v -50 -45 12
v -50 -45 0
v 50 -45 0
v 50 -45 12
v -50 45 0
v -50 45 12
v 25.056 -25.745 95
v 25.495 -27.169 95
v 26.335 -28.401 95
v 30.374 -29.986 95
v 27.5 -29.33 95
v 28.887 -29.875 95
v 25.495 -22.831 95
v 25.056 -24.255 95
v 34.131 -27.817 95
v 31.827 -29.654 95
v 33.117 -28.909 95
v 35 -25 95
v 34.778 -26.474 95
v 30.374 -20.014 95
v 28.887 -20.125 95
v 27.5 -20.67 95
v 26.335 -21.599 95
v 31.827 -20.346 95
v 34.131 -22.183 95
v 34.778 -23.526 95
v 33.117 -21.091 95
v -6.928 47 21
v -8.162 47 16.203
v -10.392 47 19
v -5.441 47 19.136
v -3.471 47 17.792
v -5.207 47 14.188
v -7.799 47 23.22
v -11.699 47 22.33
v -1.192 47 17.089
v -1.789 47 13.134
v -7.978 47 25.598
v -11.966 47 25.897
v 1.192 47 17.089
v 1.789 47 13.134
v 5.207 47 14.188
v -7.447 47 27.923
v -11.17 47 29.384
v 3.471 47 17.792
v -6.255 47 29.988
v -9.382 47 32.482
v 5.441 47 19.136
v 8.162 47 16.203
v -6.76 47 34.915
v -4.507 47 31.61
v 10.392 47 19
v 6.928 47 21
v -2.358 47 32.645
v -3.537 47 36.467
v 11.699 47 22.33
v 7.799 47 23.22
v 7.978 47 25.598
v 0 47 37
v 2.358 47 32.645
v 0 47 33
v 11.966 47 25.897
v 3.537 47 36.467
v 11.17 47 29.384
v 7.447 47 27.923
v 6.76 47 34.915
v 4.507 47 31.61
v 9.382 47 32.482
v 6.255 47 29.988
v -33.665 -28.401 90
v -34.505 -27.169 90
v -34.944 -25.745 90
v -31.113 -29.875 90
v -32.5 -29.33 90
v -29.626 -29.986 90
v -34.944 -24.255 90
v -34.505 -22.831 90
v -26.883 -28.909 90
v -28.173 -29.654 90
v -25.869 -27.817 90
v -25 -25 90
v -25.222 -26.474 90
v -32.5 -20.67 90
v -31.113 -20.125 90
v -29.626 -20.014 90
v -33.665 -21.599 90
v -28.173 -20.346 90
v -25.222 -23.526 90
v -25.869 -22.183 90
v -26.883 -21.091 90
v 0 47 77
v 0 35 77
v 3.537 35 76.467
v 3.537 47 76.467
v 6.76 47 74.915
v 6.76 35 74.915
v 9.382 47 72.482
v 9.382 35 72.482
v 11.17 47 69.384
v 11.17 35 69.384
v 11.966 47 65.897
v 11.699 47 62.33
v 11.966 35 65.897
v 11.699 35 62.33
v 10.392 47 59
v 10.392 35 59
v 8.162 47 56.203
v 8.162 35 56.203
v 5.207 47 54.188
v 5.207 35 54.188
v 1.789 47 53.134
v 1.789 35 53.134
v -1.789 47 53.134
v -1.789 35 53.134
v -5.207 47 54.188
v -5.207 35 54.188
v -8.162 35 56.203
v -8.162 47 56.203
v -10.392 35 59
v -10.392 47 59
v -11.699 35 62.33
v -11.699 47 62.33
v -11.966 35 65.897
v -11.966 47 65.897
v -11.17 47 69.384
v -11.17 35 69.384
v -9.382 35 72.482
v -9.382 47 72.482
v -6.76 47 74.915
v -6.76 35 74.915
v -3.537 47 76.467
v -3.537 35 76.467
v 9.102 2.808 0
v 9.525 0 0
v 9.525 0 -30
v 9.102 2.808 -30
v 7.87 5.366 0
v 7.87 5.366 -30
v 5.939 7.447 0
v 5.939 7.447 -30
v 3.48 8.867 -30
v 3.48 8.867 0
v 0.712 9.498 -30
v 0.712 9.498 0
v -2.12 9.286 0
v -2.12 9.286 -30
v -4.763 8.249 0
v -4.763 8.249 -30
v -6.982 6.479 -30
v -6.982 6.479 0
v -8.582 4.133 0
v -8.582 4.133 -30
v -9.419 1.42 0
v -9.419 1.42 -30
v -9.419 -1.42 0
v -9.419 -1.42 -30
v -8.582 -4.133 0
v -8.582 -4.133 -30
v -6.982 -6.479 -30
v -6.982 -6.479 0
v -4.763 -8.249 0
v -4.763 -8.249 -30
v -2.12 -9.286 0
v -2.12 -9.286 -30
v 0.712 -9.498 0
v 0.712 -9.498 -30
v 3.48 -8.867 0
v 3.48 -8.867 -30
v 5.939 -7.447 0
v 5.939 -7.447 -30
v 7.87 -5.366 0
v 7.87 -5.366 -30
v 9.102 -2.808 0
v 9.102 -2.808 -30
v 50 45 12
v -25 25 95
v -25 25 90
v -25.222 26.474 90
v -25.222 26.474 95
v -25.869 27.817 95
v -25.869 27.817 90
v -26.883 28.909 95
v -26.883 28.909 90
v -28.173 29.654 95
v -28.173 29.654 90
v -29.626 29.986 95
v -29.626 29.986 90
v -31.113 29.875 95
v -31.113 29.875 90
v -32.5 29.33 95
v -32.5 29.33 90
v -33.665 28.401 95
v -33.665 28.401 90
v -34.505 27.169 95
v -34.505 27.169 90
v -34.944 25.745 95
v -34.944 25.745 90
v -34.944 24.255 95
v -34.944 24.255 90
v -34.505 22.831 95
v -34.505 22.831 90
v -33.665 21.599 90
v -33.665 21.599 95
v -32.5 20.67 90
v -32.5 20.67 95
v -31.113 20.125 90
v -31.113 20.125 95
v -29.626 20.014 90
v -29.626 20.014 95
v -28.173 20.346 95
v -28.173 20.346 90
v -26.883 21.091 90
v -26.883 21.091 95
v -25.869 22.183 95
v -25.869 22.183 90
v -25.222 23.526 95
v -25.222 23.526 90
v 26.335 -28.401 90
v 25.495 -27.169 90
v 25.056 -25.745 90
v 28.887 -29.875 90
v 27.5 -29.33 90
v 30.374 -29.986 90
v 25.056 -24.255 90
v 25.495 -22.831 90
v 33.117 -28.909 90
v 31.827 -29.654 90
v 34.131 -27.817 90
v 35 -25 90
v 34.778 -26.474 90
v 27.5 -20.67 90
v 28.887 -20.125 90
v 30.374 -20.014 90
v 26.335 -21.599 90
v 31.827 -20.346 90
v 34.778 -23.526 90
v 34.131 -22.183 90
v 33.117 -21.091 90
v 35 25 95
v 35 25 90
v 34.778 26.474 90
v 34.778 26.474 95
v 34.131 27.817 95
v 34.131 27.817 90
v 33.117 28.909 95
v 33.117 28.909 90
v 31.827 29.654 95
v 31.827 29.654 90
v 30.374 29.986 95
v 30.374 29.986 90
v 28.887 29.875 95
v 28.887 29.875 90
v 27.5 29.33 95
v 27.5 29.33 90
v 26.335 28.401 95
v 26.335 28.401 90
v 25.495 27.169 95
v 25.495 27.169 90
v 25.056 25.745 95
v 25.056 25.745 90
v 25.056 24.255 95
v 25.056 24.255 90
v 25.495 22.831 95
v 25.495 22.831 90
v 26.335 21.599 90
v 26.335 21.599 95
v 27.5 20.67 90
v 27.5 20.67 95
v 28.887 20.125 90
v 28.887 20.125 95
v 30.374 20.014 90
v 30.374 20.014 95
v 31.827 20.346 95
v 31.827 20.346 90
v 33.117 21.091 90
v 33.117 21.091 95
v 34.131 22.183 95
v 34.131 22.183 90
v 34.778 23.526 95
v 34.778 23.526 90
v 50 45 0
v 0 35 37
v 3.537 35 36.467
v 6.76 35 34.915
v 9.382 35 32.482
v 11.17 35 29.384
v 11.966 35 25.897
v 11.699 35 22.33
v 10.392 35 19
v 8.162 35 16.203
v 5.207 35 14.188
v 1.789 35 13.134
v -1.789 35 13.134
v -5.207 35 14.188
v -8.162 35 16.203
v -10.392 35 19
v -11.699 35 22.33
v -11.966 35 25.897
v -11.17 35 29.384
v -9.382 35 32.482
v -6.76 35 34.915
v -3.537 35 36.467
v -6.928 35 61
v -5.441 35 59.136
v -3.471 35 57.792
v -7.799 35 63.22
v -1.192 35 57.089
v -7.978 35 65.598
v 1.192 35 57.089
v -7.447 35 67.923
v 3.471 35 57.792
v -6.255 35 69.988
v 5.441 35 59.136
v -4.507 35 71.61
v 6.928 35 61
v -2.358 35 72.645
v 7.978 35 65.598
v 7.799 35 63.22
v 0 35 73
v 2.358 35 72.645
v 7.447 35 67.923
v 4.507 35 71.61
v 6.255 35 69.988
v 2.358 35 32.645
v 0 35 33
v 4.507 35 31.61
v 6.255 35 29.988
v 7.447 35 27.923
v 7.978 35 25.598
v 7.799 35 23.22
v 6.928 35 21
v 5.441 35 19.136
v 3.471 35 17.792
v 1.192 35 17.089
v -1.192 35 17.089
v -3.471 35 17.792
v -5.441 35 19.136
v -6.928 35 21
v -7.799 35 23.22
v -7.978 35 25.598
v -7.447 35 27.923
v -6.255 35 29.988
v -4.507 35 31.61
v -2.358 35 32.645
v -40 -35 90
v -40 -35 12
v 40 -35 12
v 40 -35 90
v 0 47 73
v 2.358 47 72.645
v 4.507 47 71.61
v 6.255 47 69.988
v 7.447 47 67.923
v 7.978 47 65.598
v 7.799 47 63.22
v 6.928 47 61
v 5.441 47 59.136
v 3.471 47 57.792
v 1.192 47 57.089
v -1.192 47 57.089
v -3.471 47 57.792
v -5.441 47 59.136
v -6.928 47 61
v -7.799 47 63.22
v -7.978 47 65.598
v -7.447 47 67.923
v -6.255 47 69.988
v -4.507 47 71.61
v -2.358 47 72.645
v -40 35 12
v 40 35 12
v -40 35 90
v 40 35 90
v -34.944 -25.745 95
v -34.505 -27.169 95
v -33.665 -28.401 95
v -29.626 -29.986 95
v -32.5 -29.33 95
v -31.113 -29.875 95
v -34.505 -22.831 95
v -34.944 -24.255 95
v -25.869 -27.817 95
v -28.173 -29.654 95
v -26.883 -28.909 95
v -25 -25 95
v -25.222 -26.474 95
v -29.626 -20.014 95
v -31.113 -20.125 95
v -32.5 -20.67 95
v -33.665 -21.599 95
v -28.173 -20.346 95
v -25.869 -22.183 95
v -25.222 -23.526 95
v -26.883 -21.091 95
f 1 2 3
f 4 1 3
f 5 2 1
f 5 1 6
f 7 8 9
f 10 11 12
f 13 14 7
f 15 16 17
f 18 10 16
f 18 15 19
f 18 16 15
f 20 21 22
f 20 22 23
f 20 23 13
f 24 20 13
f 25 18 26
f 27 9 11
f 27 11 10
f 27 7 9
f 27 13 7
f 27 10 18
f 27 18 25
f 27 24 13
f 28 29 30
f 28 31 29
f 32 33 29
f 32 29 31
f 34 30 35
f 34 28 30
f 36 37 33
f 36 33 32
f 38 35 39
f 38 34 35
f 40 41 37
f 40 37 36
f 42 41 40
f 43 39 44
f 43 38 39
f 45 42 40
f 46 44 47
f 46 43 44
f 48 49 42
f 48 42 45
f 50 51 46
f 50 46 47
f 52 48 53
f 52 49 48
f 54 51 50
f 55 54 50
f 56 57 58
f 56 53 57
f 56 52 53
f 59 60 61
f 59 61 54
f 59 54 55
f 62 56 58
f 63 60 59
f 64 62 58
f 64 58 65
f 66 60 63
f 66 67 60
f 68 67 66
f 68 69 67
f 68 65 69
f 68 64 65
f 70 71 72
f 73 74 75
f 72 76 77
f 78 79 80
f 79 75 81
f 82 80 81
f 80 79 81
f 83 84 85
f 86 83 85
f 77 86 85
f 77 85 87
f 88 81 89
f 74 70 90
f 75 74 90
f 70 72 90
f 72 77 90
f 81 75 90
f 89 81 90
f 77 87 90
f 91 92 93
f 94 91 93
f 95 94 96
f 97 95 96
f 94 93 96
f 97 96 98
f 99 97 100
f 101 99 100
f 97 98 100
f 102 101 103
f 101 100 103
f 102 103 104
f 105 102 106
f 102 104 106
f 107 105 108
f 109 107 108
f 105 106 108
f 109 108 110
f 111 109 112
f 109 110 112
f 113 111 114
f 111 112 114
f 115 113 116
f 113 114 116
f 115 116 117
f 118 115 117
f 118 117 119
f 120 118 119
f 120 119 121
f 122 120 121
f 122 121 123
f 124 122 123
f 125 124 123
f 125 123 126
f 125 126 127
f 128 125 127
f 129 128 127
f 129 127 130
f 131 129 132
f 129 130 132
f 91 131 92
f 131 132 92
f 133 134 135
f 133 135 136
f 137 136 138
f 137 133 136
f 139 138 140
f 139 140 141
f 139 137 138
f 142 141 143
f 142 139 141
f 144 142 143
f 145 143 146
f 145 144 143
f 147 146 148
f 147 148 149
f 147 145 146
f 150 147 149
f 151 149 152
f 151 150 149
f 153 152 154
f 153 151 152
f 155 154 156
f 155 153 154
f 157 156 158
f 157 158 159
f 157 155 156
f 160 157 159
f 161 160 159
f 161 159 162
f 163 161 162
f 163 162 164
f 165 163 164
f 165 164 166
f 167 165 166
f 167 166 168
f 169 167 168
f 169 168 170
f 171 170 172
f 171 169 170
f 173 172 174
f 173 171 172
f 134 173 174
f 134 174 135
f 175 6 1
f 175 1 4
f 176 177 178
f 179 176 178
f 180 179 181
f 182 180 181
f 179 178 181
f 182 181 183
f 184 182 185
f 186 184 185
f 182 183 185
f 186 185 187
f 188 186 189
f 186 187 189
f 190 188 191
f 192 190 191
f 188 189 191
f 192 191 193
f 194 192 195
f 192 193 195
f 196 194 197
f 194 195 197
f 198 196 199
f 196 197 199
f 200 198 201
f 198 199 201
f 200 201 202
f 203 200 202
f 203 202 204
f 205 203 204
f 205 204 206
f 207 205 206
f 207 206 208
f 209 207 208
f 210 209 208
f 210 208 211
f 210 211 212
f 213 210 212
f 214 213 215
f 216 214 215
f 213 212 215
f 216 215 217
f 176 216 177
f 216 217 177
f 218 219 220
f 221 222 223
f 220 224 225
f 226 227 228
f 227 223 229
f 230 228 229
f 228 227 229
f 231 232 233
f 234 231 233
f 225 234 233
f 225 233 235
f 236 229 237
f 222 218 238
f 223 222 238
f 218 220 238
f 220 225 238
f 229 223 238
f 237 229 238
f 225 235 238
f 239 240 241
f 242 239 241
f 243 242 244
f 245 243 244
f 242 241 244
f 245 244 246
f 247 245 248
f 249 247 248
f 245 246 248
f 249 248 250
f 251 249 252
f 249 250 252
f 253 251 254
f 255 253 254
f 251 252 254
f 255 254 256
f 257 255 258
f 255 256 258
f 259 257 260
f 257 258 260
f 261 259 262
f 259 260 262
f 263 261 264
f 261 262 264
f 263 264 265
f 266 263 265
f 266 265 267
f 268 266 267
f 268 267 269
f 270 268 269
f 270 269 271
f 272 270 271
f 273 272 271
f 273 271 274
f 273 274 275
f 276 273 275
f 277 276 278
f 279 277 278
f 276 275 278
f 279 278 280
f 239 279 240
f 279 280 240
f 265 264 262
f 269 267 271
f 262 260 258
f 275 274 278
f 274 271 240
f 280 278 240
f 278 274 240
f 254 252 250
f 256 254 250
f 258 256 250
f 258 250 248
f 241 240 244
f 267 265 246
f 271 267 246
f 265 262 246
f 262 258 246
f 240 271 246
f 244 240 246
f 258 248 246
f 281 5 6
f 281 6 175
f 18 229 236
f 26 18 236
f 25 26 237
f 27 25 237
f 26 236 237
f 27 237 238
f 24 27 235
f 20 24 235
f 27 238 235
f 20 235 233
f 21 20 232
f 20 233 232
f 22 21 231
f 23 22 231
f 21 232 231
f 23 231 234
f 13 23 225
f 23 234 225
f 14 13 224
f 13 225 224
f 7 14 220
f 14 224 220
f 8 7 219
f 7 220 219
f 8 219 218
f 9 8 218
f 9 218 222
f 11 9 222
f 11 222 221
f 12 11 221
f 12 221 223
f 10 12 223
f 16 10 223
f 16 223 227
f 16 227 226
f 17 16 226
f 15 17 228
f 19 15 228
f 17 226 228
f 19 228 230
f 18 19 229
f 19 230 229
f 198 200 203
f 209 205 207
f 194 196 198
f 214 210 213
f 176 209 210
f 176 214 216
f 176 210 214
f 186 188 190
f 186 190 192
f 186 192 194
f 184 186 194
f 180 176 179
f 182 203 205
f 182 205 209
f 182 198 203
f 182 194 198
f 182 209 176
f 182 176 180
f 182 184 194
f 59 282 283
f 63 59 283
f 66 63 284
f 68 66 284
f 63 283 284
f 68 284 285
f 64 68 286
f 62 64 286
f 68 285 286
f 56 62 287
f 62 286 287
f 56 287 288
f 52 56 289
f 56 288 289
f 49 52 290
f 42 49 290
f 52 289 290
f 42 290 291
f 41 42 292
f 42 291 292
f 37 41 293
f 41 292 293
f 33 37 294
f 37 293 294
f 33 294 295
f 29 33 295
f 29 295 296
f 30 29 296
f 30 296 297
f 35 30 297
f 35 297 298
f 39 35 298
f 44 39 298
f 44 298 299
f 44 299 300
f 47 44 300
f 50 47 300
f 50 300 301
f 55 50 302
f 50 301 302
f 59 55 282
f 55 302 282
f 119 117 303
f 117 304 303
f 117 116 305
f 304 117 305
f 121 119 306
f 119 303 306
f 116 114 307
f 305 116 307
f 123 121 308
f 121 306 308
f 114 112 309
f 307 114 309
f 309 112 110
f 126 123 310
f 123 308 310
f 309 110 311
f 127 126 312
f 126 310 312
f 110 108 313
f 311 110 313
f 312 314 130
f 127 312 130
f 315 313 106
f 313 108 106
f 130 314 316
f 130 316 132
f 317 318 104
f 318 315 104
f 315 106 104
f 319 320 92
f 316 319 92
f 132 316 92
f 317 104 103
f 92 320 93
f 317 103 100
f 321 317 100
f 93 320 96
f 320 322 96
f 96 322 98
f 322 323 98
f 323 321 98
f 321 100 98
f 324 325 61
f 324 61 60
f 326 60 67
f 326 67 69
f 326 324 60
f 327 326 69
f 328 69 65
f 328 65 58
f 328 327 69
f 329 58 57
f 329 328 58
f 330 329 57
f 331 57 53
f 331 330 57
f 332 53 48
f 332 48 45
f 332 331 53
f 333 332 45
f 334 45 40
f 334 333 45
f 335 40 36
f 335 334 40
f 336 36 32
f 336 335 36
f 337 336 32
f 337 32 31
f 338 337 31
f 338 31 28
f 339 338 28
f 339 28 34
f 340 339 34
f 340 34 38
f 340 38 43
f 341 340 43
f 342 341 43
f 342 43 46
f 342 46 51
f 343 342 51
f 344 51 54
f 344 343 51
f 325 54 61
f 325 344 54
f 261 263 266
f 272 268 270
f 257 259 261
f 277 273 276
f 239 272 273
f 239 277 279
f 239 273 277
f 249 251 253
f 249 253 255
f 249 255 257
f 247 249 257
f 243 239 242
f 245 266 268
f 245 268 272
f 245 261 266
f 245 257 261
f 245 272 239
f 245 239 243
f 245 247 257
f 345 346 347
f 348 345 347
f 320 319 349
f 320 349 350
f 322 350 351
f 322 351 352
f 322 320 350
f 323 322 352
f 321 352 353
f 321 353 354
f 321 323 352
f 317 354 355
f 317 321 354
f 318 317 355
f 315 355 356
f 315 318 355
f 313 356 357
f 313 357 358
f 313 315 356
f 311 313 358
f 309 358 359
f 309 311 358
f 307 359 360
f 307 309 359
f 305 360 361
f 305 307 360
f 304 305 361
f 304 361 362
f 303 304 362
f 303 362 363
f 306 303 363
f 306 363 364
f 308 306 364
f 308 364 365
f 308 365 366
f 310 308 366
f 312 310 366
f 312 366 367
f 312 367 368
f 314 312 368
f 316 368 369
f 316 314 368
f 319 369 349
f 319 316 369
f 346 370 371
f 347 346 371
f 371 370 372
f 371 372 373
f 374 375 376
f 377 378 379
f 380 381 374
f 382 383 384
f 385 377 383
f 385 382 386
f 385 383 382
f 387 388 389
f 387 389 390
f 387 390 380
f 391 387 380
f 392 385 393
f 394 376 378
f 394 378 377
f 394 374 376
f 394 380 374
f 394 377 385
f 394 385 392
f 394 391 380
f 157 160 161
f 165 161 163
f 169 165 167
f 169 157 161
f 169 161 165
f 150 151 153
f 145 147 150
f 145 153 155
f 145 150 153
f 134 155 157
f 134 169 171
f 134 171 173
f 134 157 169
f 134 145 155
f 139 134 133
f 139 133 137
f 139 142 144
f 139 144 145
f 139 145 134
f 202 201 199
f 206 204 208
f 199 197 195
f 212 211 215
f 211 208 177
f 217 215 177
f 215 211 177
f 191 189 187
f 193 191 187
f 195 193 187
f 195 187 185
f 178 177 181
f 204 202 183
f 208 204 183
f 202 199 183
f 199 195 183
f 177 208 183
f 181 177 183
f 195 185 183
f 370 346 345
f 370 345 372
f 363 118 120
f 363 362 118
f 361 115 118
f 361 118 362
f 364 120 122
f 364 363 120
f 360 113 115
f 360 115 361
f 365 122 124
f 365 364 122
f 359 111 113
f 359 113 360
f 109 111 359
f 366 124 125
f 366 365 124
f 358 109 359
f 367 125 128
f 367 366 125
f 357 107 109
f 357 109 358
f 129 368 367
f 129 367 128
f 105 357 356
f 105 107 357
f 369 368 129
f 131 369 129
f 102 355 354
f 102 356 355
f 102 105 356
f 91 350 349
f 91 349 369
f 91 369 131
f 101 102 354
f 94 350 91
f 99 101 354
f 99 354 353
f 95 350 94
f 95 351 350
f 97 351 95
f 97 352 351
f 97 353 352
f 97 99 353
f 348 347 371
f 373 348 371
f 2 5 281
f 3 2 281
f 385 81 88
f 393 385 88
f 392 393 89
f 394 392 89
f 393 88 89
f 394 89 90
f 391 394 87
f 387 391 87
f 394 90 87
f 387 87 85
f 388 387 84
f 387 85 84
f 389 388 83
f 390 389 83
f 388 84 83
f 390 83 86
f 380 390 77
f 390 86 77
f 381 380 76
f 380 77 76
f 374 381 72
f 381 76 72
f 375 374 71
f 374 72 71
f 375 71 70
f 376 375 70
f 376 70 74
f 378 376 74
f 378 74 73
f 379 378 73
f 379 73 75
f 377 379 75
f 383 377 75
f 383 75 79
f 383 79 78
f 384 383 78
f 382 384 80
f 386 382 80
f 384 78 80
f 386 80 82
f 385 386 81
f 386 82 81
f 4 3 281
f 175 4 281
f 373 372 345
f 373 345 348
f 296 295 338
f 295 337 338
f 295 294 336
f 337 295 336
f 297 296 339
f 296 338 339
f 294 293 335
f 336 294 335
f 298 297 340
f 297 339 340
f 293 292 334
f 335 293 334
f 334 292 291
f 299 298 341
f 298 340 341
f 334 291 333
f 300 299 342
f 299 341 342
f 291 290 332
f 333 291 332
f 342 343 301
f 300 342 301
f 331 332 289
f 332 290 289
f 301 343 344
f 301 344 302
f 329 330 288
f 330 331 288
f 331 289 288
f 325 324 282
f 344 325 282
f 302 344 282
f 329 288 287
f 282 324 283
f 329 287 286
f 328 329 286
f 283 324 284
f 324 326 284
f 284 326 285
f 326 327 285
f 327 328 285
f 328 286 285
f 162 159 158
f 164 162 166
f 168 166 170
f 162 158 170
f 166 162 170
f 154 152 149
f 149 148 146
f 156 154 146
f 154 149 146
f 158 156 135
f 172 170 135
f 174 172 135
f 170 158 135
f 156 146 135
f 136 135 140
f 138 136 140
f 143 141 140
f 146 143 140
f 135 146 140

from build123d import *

# Parameters (mm, degrees)
HOUSING_80X70X78_ASSUMED_START            = 12
SKETCH1_W                                 = 80
SKETCH1_H                                 = 70
HOUSING_80X70X78_ASSUMED_DEPTH            = 78
SKETCH2_W                                 = 100
SKETCH2_H                                 = 90
FLANGE_100X90_ASSUMED_DEPTH               = 12
SKETCH3_R                                 = 9.525
SHAFT_D19P05_LISTING_LENGTH_ASSUMED_DEPTH = 30
FASTENER_ENVELOPE_ASSUMED_START           = 90
SKETCH4_R                                 = 5
FASTENER_ENVELOPE_ASSUMED_DEPTH           = 5
BOSS_EXTRUDE5_START                       = 90
SKETCH5_R                                 = 5
BOSS_EXTRUDE5_DEPTH                       = 5
BOSS_EXTRUDE6_START                       = 90
SKETCH6_R                                 = 5
BOSS_EXTRUDE6_DEPTH                       = 5
BOSS_EXTRUDE7_START                       = 90
SKETCH7_R                                 = 5
BOSS_EXTRUDE7_DEPTH                       = 5
INLET_3_8NPT_PORT_LOCATION_ASSUMED_START  = 35
SKETCH8_R                                 = 12
SKETCH8_R_2                               = 8
INLET_3_8NPT_PORT_LOCATION_ASSUMED_DEPTH  = 12
OUTLET_3_8NPT_PORT_LOCATION_ASSUMED_START = 35
SKETCH9_R                                 = 12
SKETCH9_R_2                               = 8
OUTLET_3_8NPT_PORT_LOCATION_ASSUMED_DEPTH = 12


with BuildPart() as part:
    # Sketch1 → Housing_80x70x78_ASSUMED (new body)
    with BuildSketch(Plane.XY.offset(HOUSING_80X70X78_ASSUMED_START)):
        Rectangle(SKETCH1_W, SKETCH1_H)
    extrude(amount=HOUSING_80X70X78_ASSUMED_DEPTH)


with BuildPart() as body_2:
    # Sketch2 → Flange_100x90_ASSUMED (new body)
    with BuildSketch(Plane.XY):
        Rectangle(SKETCH2_W, SKETCH2_H)
    extrude(amount=FLANGE_100X90_ASSUMED_DEPTH)


with BuildPart() as body_3:
    # Sketch3 → Shaft_D19p05_listing_length_ASSUMED (new body)
    with BuildSketch(Plane.XY):
        Circle(SKETCH3_R)
    extrude(amount=-SHAFT_D19P05_LISTING_LENGTH_ASSUMED_DEPTH)


with BuildPart() as body_4:
    # Sketch4 → Fastener_envelope_ASSUMED (new body)
    with BuildSketch(Plane.XY.offset(FASTENER_ENVELOPE_ASSUMED_START)):
        with Locations((-30, -25)):
            Circle(SKETCH4_R)
    extrude(amount=FASTENER_ENVELOPE_ASSUMED_DEPTH)


with BuildPart() as body_5:
    # Sketch5 → Boss-Extrude5 (new body)
    with BuildSketch(Plane.XY.offset(BOSS_EXTRUDE5_START)):
        with Locations((-30, 25)):
            Circle(SKETCH5_R)
    extrude(amount=BOSS_EXTRUDE5_DEPTH)


with BuildPart() as body_6:
    # Sketch6 → Boss-Extrude6 (new body)
    with BuildSketch(Plane.XY.offset(BOSS_EXTRUDE6_START)):
        with Locations((30, -25)):
            Circle(SKETCH6_R)
    extrude(amount=BOSS_EXTRUDE6_DEPTH)


with BuildPart() as body_7:
    # Sketch7 → Boss-Extrude7 (new body)
    with BuildSketch(Plane.XY.offset(BOSS_EXTRUDE7_START)):
        with Locations((30, 25)):
            Circle(SKETCH7_R)
    extrude(amount=BOSS_EXTRUDE7_DEPTH)


with BuildPart() as body_8:
    # Sketch8 → Inlet_3_8NPT_port_location_ASSUMED (new body)
    with BuildSketch(Plane(origin=(0, 0, 0), x_dir=(1, 0, 0), z_dir=(0, 1, 0)).offset(INLET_3_8NPT_PORT_LOCATION_ASSUMED_START)):
        with Locations(Location((0, -25, 0), (0, 0, 270))):
            Circle(SKETCH8_R)
        with Locations(Location((0, -25, 0), (0, 0, 270))):
            Circle(SKETCH8_R_2, mode=Mode.SUBTRACT)
    extrude(amount=INLET_3_8NPT_PORT_LOCATION_ASSUMED_DEPTH)


with BuildPart() as body_9:
    # Sketch9 → Outlet_3_8NPT_port_location_ASSUMED (new body)
    with BuildSketch(Plane(origin=(0, 0, 0), x_dir=(1, 0, 0), z_dir=(0, 1, 0)).offset(OUTLET_3_8NPT_PORT_LOCATION_ASSUMED_START)):
        with Locations(Location((0, -65, 0), (0, 0, 270))):
            Circle(SKETCH9_R)
        with Locations(Location((0, -65, 0), (0, 0, 270))):
            Circle(SKETCH9_R_2, mode=Mode.SUBTRACT)
    extrude(amount=OUTLET_3_8NPT_PORT_LOCATION_ASSUMED_DEPTH)


solid = Compound([part.part, body_2.part, body_3.part, body_4.part, body_5.part, body_6.part, body_7.part, body_8.part, body_9.part])
